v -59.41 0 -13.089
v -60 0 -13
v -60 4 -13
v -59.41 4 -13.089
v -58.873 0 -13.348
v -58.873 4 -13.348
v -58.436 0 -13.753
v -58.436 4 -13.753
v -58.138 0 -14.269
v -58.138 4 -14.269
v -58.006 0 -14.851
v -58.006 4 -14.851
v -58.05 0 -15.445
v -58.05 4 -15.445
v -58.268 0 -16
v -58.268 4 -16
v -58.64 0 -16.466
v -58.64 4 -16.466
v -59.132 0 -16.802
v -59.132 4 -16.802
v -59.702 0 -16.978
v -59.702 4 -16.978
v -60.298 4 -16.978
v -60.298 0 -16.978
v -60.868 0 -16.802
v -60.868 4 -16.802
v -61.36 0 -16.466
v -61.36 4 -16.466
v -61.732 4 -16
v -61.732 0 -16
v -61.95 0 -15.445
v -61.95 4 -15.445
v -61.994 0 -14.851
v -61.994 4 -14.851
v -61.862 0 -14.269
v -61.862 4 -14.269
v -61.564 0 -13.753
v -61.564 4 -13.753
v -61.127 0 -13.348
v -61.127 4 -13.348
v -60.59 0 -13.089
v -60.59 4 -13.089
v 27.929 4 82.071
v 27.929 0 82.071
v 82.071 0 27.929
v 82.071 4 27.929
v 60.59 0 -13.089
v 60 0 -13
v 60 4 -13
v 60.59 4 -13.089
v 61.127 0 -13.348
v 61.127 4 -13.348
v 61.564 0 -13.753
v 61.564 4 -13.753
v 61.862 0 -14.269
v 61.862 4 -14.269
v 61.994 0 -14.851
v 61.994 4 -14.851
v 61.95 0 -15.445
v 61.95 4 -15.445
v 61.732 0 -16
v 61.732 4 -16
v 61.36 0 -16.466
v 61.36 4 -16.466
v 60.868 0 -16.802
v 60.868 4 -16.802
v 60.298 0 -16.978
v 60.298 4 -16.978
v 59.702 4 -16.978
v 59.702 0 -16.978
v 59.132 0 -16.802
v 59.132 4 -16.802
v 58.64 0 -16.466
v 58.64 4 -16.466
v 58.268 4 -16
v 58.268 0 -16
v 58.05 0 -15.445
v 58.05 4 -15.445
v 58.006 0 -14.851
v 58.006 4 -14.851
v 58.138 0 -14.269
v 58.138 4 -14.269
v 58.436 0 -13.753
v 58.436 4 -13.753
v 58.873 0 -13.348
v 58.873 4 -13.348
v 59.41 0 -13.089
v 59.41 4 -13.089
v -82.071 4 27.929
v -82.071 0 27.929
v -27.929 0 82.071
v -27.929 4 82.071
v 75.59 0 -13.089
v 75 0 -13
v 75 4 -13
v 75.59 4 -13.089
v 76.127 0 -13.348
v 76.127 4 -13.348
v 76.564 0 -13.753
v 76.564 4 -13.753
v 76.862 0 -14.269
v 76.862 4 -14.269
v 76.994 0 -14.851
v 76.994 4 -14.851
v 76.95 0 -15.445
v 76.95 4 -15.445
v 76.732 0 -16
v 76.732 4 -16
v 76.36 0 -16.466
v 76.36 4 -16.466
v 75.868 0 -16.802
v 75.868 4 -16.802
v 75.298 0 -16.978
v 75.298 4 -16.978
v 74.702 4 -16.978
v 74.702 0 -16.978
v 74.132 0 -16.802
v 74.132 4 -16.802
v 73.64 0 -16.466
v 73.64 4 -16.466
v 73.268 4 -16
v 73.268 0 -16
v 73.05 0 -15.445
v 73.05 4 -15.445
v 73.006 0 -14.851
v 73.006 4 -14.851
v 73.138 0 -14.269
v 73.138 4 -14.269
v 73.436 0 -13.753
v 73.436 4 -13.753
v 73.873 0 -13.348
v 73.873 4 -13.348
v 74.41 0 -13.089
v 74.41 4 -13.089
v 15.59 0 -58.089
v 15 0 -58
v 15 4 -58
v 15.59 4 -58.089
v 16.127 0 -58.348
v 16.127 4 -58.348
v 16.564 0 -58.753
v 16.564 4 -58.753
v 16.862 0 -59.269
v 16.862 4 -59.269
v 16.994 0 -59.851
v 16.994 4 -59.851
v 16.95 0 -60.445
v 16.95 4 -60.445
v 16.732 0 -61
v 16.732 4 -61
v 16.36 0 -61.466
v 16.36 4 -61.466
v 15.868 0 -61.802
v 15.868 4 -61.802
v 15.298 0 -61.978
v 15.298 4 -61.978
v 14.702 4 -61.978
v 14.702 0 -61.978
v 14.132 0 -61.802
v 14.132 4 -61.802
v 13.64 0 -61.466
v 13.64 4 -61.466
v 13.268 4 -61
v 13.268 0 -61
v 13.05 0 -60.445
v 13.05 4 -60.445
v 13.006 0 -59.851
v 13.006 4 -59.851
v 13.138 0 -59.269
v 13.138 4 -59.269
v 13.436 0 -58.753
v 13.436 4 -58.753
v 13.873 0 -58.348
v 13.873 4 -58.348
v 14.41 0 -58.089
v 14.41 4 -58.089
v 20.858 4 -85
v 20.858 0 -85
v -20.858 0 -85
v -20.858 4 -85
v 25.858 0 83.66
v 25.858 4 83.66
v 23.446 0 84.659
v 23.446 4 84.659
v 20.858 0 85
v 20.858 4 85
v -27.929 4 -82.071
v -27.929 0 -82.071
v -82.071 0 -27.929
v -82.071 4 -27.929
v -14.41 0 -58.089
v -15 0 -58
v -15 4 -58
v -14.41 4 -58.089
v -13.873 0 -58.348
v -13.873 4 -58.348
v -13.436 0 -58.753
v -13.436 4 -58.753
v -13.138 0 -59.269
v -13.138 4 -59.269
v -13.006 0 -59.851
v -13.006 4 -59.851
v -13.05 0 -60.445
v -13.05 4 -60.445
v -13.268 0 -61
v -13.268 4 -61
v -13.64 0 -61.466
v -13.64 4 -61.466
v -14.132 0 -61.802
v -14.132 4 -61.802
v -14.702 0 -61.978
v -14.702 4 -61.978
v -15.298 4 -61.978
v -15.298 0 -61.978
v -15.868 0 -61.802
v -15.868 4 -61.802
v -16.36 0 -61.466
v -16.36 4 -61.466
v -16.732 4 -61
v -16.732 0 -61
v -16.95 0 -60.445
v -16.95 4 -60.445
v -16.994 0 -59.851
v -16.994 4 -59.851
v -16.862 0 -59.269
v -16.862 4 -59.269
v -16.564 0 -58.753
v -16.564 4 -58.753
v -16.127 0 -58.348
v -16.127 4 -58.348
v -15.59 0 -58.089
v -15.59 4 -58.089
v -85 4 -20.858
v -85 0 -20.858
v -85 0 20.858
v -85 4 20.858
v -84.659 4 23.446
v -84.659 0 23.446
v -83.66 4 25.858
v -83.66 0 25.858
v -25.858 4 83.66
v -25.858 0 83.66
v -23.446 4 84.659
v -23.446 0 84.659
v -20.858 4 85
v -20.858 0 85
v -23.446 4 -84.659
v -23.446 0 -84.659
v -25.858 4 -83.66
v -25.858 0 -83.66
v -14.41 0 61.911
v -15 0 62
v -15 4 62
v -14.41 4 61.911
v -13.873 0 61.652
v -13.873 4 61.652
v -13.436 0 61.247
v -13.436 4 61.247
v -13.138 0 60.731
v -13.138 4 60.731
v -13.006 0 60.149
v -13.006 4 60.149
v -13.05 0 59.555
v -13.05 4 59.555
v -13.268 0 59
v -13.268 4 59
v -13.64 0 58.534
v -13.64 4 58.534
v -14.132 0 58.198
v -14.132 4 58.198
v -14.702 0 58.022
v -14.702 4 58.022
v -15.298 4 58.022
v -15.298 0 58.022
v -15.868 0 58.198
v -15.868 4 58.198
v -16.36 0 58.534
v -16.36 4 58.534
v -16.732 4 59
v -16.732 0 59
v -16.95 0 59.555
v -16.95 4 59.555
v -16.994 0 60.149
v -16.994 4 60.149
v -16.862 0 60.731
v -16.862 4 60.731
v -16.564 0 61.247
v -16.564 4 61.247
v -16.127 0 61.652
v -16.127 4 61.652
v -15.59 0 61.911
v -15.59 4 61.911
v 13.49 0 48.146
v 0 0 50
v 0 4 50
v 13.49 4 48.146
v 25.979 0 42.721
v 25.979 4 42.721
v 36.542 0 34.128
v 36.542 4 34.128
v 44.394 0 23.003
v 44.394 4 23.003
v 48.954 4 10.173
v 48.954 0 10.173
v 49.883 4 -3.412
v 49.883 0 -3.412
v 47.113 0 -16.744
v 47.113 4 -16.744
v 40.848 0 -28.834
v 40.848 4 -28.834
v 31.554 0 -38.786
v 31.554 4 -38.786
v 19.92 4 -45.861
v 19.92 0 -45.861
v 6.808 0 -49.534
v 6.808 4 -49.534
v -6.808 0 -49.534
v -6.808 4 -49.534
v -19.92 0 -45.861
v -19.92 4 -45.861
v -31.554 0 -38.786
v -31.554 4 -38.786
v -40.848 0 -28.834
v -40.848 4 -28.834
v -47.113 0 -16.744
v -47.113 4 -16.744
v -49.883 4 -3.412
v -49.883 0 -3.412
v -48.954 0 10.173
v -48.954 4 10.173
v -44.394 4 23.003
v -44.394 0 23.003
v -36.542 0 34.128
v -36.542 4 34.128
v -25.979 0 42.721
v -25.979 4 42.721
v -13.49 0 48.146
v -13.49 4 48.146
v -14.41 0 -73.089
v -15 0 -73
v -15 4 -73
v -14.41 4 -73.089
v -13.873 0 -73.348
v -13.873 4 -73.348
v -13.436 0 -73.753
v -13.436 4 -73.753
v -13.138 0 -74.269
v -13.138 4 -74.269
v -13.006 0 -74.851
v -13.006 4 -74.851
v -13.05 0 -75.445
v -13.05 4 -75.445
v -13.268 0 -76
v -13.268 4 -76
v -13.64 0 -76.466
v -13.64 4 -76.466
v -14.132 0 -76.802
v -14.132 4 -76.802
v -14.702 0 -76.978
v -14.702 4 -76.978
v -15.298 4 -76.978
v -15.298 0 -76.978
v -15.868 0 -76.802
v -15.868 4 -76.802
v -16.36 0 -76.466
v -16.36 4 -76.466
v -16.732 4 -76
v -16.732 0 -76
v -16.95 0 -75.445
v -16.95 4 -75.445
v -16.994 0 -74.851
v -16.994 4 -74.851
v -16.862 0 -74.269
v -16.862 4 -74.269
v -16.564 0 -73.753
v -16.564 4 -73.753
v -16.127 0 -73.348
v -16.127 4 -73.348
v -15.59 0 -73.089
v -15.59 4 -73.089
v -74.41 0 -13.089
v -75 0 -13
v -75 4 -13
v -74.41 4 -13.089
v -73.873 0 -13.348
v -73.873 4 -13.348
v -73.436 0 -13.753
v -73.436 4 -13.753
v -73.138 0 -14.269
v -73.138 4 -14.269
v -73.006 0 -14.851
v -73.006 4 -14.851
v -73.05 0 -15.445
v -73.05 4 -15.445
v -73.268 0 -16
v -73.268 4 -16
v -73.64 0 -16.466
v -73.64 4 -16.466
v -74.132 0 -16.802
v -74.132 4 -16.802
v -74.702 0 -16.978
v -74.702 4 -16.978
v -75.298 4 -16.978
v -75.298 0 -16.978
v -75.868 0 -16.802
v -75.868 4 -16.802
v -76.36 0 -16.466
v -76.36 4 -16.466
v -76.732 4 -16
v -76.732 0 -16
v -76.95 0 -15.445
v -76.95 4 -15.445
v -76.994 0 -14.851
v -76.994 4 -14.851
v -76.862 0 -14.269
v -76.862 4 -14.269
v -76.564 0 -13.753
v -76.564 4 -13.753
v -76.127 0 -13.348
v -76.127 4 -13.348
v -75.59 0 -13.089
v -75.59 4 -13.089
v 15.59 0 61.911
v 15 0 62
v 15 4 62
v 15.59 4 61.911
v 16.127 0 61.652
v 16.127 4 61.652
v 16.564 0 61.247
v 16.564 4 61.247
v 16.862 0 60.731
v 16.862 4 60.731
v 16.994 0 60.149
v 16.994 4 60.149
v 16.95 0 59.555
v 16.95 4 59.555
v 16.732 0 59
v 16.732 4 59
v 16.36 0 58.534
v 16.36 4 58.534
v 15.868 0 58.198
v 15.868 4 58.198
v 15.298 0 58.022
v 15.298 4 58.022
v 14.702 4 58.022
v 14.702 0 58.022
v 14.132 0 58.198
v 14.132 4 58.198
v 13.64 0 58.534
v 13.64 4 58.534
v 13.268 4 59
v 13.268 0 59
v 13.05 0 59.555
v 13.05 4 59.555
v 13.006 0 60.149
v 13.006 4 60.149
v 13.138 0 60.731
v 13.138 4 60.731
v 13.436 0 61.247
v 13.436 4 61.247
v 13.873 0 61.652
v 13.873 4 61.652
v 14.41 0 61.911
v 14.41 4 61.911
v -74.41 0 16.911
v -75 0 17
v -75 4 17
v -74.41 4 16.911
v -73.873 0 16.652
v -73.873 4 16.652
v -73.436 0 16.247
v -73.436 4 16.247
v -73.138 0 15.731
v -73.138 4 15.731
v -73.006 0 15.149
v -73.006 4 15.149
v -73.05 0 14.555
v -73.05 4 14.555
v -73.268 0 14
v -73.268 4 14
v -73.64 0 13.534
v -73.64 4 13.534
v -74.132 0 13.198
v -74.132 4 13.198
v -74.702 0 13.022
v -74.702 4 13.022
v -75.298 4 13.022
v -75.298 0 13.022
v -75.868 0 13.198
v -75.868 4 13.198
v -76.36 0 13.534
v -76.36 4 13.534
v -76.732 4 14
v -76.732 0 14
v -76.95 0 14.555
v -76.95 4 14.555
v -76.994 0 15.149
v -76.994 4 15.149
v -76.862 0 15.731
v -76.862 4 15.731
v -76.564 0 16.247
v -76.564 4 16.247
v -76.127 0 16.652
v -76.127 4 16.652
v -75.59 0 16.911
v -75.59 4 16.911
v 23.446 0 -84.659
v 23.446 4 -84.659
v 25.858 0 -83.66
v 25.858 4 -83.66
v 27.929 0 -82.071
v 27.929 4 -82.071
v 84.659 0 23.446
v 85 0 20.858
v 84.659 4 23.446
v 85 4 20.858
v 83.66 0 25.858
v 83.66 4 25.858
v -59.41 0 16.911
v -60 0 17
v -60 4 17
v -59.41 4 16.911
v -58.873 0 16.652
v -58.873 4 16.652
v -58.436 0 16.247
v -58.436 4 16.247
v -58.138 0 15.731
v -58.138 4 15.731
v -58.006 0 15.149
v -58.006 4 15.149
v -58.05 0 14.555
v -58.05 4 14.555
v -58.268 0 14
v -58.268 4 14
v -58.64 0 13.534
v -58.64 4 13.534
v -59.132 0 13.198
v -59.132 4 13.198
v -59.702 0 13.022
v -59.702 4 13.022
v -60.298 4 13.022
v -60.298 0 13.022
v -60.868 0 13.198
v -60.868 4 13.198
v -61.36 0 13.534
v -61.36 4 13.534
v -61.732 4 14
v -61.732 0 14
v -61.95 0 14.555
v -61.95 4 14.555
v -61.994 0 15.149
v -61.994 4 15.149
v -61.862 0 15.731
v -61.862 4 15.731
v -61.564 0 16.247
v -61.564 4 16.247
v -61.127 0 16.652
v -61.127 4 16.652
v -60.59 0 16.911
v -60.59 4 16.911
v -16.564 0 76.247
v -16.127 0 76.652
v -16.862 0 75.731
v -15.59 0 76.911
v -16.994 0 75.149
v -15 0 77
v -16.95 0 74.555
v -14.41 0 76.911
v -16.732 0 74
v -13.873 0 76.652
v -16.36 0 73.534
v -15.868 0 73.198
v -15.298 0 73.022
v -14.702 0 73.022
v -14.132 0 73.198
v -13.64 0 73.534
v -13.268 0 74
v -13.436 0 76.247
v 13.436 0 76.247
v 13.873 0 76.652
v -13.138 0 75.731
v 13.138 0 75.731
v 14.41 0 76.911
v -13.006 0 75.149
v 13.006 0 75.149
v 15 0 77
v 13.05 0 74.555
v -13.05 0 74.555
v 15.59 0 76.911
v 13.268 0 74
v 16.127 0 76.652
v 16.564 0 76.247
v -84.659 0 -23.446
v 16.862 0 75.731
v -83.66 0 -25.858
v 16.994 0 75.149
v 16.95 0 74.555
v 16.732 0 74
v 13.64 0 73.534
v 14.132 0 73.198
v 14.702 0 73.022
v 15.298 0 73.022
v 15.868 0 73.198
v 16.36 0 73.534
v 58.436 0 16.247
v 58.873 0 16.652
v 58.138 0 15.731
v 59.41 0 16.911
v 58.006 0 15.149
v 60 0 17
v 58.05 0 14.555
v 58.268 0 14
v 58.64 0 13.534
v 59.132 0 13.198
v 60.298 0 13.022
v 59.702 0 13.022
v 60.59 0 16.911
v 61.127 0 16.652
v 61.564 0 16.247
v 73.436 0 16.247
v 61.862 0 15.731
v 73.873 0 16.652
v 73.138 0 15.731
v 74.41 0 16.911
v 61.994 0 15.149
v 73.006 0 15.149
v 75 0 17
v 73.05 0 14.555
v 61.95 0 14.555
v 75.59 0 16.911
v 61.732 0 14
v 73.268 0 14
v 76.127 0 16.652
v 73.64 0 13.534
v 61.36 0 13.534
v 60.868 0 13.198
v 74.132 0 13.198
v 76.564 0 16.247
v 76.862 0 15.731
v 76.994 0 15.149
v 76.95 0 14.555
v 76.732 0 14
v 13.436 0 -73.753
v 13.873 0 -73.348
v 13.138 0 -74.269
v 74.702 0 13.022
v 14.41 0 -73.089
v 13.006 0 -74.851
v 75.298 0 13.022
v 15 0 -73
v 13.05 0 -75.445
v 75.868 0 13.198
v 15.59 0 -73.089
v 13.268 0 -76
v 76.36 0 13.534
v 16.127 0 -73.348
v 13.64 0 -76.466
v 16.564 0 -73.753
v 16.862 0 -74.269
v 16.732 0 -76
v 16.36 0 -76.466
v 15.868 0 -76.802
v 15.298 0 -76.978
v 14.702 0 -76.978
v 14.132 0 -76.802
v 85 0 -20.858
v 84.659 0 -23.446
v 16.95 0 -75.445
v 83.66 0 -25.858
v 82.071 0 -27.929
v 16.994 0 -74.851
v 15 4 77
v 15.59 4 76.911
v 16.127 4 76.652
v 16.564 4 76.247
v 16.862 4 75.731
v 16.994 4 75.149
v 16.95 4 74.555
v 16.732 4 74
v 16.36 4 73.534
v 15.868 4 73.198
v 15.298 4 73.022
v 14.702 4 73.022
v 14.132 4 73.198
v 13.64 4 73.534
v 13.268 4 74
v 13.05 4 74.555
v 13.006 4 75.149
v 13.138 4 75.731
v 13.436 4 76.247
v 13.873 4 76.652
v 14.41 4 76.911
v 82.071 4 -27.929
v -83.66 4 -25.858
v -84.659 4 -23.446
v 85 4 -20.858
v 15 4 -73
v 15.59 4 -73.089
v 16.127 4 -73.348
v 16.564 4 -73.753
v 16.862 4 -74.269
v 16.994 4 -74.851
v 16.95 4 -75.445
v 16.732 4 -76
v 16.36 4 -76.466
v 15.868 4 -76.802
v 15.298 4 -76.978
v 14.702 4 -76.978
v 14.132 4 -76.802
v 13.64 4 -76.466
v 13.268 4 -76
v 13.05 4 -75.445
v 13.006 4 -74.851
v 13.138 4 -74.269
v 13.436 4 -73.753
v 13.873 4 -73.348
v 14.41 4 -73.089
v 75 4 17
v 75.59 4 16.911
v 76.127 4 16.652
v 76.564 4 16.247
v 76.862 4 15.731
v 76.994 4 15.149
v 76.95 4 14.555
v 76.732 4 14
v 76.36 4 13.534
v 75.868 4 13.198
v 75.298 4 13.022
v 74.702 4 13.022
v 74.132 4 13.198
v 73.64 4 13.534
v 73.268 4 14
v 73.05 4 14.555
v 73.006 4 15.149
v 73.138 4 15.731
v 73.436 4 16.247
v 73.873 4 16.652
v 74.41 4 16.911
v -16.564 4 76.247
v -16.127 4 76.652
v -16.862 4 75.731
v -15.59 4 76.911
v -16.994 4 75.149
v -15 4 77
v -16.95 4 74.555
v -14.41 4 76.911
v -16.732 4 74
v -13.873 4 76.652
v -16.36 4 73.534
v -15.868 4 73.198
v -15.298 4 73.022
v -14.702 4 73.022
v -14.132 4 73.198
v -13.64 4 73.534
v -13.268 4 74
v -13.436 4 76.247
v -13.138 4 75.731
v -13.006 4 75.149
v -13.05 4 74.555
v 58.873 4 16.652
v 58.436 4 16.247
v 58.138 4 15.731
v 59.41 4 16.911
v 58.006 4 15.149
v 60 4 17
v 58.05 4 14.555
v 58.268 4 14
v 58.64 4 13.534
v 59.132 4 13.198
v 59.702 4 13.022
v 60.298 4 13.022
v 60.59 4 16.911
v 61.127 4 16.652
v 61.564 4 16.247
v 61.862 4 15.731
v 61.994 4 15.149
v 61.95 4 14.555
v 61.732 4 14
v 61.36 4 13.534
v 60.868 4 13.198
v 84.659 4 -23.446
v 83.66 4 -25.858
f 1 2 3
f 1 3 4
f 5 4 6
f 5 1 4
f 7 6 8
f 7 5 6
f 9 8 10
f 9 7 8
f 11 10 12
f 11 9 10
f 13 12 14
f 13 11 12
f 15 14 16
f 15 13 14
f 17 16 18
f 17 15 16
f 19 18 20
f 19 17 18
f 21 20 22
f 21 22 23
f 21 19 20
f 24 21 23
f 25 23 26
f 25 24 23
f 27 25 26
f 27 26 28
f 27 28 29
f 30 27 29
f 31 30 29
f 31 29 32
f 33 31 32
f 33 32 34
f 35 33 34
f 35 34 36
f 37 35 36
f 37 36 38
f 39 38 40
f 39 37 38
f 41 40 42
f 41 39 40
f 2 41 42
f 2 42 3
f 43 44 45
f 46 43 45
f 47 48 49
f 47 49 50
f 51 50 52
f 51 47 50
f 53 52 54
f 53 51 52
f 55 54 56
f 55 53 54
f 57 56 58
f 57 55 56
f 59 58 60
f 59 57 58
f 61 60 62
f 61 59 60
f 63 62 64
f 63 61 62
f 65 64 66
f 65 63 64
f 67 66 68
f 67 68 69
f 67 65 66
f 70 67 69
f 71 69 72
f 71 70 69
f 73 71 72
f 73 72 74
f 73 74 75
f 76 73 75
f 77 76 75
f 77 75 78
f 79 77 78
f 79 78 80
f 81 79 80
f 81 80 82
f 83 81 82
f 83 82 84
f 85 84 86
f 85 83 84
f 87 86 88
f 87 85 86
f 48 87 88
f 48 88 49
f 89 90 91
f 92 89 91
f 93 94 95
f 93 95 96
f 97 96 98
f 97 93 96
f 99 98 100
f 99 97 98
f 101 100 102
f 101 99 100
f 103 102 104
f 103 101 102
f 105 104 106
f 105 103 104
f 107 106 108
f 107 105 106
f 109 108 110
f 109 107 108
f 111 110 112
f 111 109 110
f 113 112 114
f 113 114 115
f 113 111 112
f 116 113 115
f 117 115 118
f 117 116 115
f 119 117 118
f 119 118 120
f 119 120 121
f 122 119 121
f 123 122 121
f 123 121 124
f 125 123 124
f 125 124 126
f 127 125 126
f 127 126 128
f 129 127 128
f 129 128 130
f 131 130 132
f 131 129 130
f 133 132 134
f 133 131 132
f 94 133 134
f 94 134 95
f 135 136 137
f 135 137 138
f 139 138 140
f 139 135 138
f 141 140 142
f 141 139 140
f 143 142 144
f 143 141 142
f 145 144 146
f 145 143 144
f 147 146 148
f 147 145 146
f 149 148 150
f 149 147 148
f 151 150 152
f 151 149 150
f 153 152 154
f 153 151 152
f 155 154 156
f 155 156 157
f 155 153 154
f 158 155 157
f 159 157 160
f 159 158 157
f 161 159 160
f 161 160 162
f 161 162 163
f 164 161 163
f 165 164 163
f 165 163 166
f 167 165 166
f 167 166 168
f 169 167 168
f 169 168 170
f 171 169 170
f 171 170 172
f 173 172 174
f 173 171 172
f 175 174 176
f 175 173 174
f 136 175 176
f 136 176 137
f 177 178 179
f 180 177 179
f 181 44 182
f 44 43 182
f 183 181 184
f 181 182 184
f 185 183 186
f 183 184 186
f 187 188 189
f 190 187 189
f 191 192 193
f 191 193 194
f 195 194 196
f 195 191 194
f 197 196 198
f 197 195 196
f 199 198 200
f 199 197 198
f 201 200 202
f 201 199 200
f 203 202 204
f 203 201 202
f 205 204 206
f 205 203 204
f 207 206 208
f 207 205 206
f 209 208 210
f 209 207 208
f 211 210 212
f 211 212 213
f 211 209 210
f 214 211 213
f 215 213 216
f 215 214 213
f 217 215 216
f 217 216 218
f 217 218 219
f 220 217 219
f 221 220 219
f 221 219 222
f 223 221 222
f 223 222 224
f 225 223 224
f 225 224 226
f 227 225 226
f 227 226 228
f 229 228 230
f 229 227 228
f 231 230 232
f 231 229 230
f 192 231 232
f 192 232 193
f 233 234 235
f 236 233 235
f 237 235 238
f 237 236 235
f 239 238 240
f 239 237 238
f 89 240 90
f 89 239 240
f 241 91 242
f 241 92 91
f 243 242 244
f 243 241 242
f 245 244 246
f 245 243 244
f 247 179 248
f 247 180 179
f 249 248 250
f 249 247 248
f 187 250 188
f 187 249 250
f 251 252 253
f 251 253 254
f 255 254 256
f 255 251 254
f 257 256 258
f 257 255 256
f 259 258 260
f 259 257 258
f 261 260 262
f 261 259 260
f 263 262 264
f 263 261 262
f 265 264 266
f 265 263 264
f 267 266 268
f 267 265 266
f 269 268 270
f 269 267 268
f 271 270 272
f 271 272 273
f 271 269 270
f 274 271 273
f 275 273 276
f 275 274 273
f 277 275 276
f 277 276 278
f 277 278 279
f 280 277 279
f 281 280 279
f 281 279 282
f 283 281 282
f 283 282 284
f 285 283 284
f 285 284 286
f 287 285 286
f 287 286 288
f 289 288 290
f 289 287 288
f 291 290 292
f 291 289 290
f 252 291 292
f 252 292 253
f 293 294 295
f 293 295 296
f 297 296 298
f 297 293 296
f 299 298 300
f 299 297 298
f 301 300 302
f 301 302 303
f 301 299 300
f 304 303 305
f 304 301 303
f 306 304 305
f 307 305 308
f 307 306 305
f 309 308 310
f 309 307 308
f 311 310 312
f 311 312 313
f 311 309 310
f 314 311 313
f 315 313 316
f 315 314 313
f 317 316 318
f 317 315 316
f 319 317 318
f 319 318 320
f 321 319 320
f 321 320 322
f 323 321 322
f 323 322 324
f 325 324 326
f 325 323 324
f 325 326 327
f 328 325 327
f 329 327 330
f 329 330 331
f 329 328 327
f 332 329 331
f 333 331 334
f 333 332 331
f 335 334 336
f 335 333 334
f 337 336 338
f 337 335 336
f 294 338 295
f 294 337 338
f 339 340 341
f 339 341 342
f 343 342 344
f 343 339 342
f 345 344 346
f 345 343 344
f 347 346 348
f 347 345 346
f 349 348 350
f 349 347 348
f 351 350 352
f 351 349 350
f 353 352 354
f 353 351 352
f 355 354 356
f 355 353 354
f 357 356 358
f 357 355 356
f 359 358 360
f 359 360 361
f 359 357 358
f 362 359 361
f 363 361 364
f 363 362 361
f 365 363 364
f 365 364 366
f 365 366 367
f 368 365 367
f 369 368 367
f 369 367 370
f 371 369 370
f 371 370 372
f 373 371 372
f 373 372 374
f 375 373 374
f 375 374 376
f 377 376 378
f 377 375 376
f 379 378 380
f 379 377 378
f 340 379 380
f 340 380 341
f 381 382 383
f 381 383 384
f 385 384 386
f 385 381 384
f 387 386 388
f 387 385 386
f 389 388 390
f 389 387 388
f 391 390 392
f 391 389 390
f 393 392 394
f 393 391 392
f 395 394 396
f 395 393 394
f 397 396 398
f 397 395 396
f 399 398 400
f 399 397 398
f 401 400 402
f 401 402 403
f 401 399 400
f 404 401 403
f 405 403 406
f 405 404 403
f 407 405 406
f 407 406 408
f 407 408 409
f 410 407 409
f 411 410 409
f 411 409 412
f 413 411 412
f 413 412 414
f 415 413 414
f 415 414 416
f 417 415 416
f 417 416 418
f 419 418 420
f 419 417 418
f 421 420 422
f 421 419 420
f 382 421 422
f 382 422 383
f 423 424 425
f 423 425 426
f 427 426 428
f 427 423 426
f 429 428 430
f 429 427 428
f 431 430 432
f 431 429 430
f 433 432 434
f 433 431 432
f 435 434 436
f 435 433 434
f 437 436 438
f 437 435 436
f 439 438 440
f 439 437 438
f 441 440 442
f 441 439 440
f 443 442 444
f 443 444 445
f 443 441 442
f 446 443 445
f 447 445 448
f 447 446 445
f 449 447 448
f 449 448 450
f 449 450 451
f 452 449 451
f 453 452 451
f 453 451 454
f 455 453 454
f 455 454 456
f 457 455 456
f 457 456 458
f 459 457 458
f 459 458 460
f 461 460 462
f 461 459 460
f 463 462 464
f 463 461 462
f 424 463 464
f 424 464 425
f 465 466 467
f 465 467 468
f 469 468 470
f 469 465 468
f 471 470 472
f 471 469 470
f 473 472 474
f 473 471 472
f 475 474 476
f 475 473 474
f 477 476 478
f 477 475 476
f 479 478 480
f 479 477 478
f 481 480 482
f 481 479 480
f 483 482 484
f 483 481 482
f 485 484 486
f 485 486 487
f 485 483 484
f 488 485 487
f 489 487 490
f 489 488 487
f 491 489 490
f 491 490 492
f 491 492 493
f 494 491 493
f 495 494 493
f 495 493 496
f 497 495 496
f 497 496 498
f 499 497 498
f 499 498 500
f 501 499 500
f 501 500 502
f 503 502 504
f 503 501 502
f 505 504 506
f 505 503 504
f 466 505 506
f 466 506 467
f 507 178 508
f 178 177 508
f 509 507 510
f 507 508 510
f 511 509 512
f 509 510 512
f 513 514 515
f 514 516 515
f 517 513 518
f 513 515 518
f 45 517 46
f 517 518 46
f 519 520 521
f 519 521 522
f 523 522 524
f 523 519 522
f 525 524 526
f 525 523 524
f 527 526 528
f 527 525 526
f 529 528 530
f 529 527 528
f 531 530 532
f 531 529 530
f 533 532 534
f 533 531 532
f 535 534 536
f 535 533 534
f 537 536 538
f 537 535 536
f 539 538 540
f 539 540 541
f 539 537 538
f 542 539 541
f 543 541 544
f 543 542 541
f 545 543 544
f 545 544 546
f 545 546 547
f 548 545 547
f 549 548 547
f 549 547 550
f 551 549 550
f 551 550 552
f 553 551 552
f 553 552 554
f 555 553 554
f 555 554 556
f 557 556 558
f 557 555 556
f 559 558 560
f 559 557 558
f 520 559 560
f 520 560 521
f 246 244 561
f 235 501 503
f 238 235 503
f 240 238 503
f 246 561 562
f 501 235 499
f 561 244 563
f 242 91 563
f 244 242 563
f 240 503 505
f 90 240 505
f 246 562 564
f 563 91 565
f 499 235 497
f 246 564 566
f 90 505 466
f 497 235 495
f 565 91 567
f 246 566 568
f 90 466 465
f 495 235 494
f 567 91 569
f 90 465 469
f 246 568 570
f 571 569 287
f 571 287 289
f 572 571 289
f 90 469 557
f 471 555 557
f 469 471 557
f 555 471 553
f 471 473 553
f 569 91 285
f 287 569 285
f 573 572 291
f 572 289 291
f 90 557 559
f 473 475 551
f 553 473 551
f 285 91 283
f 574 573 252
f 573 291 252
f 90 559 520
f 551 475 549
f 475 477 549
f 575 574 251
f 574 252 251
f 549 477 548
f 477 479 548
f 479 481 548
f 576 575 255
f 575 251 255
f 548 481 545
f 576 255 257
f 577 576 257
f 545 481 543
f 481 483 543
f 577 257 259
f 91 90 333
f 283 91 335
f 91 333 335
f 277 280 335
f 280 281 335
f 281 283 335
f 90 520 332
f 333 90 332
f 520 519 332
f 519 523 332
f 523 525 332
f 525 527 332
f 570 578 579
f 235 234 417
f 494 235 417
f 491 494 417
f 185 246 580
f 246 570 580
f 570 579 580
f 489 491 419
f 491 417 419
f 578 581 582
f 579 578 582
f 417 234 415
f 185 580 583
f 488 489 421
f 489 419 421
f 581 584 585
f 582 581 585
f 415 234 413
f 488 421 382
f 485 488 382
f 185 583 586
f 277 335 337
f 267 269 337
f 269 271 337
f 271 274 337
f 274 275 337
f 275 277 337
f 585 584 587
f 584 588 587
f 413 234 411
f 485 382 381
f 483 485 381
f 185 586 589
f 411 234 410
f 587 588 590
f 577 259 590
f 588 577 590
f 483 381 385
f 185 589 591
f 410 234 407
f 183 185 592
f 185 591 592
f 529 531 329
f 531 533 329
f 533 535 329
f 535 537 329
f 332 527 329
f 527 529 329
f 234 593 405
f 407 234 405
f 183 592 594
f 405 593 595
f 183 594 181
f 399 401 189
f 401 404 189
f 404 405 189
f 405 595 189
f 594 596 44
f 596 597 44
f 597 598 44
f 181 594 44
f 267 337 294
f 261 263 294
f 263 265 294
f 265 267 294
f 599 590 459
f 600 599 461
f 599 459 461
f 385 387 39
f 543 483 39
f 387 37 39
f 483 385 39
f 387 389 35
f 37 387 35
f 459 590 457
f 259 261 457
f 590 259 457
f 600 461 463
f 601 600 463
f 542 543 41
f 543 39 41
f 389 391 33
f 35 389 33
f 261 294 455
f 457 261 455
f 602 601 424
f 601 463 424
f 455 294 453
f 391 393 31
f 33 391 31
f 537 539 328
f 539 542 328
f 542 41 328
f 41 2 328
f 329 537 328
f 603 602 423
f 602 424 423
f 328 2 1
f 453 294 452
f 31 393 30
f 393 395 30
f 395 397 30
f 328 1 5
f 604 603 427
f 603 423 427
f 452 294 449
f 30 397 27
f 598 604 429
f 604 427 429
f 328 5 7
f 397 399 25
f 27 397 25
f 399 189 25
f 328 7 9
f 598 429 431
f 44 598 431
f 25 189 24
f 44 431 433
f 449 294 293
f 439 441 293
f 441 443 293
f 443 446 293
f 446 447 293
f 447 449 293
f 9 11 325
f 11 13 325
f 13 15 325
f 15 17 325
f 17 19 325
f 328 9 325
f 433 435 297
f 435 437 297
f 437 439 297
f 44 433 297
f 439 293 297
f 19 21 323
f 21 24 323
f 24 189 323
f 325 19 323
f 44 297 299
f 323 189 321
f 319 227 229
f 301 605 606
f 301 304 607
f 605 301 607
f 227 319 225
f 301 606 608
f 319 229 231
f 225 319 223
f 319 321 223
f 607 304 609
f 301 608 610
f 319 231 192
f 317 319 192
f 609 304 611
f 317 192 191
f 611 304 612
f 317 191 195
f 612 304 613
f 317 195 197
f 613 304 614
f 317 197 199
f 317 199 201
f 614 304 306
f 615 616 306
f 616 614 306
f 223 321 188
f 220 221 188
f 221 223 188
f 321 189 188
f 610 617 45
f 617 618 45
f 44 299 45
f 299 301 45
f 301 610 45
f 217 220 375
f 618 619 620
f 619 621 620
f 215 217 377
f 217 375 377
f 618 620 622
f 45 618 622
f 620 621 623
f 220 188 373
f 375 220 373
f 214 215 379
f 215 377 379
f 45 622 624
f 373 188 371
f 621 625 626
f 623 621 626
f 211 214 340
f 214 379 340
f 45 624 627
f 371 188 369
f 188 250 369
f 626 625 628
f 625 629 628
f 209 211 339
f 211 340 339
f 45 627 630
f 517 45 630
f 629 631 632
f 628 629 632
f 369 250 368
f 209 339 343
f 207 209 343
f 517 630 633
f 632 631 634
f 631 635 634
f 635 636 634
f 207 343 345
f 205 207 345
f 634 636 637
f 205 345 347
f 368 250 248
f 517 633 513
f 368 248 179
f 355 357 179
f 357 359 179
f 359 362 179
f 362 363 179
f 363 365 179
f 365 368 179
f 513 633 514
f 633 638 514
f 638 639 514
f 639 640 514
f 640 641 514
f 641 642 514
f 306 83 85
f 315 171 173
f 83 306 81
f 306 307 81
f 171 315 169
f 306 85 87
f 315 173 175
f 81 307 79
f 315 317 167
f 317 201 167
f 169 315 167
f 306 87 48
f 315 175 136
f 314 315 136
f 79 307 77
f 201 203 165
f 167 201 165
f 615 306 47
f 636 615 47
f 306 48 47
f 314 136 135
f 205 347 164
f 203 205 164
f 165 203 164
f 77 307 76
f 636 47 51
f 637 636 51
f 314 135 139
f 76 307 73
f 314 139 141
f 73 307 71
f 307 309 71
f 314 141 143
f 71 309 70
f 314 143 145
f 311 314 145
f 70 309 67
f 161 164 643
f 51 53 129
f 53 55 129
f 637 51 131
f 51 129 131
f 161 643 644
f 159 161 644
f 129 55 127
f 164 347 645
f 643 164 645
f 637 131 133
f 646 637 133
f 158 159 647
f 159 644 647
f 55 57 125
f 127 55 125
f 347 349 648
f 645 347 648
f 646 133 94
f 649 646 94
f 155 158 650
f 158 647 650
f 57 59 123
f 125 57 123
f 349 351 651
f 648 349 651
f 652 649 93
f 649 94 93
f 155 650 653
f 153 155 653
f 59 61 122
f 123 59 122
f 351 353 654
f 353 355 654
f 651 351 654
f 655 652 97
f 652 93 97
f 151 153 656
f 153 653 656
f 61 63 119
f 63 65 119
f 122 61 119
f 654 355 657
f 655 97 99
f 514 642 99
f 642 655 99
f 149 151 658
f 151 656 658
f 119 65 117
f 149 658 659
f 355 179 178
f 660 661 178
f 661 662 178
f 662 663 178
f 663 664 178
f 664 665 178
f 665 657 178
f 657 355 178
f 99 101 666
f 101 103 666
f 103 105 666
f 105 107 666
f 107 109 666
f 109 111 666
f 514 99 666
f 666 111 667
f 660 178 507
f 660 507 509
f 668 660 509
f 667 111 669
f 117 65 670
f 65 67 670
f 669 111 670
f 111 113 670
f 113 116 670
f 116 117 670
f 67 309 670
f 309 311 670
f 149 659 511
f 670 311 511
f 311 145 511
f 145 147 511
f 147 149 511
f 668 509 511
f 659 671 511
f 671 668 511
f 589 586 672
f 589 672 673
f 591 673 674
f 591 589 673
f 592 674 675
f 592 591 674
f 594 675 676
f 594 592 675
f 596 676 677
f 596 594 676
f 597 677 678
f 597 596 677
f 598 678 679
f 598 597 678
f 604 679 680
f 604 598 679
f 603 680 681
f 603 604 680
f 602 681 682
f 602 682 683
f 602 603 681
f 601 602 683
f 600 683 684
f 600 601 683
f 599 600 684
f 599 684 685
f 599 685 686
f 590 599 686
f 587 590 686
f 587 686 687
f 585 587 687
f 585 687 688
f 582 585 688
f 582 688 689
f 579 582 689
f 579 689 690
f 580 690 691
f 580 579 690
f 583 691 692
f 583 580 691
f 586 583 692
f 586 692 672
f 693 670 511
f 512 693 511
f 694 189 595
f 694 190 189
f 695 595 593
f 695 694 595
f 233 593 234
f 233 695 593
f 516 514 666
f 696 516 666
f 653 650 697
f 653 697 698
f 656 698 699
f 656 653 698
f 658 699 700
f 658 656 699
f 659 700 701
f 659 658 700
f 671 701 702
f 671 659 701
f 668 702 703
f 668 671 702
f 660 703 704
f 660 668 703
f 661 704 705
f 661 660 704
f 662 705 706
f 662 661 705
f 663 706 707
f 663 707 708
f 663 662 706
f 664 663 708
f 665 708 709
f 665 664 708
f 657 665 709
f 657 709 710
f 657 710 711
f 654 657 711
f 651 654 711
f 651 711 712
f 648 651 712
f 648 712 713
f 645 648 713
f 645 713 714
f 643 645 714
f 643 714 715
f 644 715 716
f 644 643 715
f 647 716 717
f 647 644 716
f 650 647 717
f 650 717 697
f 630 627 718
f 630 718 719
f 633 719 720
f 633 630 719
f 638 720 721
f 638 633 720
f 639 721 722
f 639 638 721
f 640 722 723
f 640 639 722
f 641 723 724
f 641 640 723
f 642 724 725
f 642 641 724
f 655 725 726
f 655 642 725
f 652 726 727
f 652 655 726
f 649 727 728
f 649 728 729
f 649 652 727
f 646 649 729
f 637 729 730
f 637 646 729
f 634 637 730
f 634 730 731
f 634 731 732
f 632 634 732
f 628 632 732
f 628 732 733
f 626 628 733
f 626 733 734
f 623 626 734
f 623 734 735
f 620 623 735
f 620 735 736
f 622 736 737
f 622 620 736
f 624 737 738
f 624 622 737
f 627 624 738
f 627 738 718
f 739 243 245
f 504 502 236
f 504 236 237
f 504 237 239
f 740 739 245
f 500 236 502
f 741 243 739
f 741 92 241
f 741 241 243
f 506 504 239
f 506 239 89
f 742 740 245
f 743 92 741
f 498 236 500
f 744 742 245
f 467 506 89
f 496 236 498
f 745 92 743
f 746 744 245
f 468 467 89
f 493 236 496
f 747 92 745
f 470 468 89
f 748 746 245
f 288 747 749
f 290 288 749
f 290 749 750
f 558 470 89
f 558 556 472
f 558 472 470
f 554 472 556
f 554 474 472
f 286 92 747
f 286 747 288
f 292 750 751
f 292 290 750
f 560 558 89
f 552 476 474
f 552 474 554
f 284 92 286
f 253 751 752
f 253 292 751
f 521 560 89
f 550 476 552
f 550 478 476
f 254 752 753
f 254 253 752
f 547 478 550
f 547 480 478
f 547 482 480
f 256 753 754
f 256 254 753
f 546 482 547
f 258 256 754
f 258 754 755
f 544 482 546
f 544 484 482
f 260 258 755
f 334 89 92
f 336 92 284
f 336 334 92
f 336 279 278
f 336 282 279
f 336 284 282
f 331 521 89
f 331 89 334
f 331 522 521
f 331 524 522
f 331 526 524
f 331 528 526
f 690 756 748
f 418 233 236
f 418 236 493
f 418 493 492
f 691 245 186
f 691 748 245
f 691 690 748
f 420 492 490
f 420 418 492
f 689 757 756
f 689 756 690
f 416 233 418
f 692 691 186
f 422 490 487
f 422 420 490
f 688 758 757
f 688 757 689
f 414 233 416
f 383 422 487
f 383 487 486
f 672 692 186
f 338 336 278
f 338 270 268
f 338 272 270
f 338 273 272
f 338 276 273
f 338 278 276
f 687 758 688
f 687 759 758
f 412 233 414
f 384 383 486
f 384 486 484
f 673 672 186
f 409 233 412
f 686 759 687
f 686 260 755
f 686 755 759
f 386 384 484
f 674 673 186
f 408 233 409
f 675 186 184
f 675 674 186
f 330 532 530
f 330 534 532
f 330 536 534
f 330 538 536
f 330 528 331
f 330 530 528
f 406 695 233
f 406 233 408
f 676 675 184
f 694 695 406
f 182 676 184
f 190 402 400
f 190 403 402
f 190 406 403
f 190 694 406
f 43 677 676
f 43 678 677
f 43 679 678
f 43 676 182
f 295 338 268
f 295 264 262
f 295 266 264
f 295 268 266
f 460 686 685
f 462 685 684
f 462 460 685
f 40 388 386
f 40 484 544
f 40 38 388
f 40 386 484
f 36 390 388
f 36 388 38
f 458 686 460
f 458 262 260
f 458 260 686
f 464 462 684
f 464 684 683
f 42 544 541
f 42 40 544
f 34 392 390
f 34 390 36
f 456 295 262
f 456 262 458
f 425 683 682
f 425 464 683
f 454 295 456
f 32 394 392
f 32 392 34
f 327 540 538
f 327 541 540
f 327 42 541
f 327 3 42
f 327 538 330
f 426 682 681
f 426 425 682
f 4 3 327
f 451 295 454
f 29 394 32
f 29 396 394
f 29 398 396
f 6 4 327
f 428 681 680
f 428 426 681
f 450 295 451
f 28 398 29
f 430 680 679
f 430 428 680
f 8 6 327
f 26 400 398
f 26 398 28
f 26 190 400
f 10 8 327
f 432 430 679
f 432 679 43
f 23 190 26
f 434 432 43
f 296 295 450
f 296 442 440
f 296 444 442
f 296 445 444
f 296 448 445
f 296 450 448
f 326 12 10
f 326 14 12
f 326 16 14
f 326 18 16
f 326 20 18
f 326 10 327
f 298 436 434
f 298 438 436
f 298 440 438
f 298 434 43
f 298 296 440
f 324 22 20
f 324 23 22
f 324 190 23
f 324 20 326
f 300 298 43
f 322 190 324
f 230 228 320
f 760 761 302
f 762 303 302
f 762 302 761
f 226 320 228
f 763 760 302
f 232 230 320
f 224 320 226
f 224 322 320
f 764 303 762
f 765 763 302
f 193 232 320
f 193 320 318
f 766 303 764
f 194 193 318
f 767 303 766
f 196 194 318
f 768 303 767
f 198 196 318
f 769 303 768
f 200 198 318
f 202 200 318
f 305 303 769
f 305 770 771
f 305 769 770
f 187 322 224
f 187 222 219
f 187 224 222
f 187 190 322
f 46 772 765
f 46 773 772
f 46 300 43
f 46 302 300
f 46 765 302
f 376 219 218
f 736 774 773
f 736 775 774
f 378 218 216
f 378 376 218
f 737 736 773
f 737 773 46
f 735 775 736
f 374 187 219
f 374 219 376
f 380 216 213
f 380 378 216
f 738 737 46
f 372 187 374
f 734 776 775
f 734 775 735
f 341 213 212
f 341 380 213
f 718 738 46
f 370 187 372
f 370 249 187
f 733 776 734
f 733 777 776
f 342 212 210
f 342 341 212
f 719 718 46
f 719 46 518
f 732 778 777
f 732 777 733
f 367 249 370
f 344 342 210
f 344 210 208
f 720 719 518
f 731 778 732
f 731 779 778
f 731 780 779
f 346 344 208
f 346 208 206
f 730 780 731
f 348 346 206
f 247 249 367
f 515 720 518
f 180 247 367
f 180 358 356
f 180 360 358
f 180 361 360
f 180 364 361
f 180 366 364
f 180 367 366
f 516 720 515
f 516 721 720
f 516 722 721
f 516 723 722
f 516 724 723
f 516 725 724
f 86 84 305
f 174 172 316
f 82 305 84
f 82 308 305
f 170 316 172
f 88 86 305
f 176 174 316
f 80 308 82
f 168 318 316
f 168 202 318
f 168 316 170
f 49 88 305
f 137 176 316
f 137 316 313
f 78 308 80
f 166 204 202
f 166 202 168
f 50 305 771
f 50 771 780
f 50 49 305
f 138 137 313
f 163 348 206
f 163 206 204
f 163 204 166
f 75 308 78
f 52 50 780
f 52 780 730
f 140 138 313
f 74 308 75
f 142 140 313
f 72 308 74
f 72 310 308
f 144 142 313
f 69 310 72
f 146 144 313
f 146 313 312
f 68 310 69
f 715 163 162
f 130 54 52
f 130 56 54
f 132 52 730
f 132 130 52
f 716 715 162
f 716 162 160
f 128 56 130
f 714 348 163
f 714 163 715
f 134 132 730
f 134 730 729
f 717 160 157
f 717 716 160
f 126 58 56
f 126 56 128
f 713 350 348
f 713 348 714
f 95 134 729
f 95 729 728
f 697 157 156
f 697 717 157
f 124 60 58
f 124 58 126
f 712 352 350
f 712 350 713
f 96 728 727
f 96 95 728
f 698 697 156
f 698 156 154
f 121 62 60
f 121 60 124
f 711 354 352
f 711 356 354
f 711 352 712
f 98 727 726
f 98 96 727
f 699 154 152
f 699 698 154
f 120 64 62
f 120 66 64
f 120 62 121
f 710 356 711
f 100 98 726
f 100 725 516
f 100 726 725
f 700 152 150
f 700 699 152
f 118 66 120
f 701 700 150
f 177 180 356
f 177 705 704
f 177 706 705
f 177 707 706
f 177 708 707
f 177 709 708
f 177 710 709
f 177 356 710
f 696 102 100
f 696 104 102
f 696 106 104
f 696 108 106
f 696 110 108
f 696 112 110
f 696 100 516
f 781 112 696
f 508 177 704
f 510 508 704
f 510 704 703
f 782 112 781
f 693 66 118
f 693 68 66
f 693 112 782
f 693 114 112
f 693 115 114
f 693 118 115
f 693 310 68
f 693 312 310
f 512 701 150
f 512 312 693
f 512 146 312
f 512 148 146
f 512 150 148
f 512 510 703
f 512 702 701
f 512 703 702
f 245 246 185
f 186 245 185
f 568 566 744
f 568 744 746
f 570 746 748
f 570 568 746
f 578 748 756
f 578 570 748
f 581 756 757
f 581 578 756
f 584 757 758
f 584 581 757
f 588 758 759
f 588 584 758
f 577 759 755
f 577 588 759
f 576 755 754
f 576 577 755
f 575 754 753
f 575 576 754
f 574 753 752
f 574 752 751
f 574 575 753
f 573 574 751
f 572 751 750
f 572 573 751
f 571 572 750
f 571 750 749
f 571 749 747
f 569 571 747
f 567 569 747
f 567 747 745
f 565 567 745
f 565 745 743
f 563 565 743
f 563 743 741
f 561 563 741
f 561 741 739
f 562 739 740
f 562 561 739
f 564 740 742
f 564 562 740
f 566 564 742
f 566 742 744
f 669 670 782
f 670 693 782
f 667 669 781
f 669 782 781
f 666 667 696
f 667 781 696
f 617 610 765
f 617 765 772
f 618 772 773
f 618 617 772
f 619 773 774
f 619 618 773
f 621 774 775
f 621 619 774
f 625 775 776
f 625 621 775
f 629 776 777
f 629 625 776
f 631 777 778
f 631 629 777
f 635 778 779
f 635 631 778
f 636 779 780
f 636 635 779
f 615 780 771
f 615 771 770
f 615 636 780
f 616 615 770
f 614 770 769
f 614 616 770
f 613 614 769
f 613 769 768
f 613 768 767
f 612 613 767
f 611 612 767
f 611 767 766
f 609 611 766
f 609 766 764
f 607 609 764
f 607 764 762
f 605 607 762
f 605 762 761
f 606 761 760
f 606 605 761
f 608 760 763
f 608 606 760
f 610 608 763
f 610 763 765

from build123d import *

# Parameters (mm, degrees)
SKETCH_1_R      = 2
SKETCH_1_R_2    = 50
EXTRUDE_1_DEPTH = 4
FILLET_1_R      = 10


with BuildPart() as part:
    # 草图1 → 凸台-拉伸1 (new body)
    with BuildSketch(Plane(origin=(0, 0, 0), x_dir=(1, 0, 0), z_dir=(0, 1, 0))):
        Polygon((25, 85), (-25, 85), (-85, 25), (-85, -25), (-25, -85), (25, -85), (85, -25), (85, 25), align=None)
        with Locations(Location((-15, -75, 0), (0, 0, 270))):
            Circle(SKETCH_1_R, mode=Mode.SUBTRACT)
        with Locations(Location((-15, -60, 0), (0, 0, 270))):
            Circle(SKETCH_1_R, mode=Mode.SUBTRACT)
        with Locations(Location((-75, -15, 0), (0, 0, 270))):
            Circle(SKETCH_1_R, mode=Mode.SUBTRACT)
        with Locations(Location((-60, -15, 0), (0, 0, 270))):
            Circle(SKETCH_1_R, mode=Mode.SUBTRACT)
        with Locations(Location((15, -75, 0), (0, 0, 270))):
            Circle(SKETCH_1_R, mode=Mode.SUBTRACT)
        with Locations(Location((15, -60, 0), (0, 0, 270))):
            Circle(SKETCH_1_R, mode=Mode.SUBTRACT)
        with Locations(Location((0, 0, 0), (0, 0, 270))):
            Circle(SKETCH_1_R_2, mode=Mode.SUBTRACT)
        with Locations(Location((60, -15, 0), (0, 0, 270))):
            Circle(SKETCH_1_R, mode=Mode.SUBTRACT)
        with Locations(Location((75, -15, 0), (0, 0, 270))):
            Circle(SKETCH_1_R, mode=Mode.SUBTRACT)
        with Locations(Location((-75, 15, 0), (0, 0, 270))):
            Circle(SKETCH_1_R, mode=Mode.SUBTRACT)
        with Locations(Location((-60, 15, 0), (0, 0, 270))):
            Circle(SKETCH_1_R, mode=Mode.SUBTRACT)
        with Locations(Location((-15, 60, 0), (0, 0, 270))):
            Circle(SKETCH_1_R, mode=Mode.SUBTRACT)
        with Locations(Location((-15, 75, 0), (0, 0, 270))):
            Circle(SKETCH_1_R, mode=Mode.SUBTRACT)
        with Locations(Location((60, 15, 0), (0, 0, 270))):
            Circle(SKETCH_1_R, mode=Mode.SUBTRACT)
        with Locations(Location((75, 15, 0), (0, 0, 270))):
            Circle(SKETCH_1_R, mode=Mode.SUBTRACT)
        with Locations(Location((15, 60, 0), (0, 0, 270))):
            Circle(SKETCH_1_R, mode=Mode.SUBTRACT)
        with Locations(Location((15, 75, 0), (0, 0, 270))):
            Circle(SKETCH_1_R, mode=Mode.SUBTRACT)
    extrude(amount=EXTRUDE_1_DEPTH)

    # 圆角1
    fillet_1_edges = [part.edges().sort_by_distance(p)[0] for p in [
        (-25, 2, 85),
        (-85, 2, 25),
        (-85, 2, -25),
        (-25, 2, -85),
        (25, 2, -85),
        (85, 2, -25),
        (85, 2, 25),
        (25, 2, 85),
    ]]
    fillet(fillet_1_edges, radius=FILLET_1_R)


solid = part.part
